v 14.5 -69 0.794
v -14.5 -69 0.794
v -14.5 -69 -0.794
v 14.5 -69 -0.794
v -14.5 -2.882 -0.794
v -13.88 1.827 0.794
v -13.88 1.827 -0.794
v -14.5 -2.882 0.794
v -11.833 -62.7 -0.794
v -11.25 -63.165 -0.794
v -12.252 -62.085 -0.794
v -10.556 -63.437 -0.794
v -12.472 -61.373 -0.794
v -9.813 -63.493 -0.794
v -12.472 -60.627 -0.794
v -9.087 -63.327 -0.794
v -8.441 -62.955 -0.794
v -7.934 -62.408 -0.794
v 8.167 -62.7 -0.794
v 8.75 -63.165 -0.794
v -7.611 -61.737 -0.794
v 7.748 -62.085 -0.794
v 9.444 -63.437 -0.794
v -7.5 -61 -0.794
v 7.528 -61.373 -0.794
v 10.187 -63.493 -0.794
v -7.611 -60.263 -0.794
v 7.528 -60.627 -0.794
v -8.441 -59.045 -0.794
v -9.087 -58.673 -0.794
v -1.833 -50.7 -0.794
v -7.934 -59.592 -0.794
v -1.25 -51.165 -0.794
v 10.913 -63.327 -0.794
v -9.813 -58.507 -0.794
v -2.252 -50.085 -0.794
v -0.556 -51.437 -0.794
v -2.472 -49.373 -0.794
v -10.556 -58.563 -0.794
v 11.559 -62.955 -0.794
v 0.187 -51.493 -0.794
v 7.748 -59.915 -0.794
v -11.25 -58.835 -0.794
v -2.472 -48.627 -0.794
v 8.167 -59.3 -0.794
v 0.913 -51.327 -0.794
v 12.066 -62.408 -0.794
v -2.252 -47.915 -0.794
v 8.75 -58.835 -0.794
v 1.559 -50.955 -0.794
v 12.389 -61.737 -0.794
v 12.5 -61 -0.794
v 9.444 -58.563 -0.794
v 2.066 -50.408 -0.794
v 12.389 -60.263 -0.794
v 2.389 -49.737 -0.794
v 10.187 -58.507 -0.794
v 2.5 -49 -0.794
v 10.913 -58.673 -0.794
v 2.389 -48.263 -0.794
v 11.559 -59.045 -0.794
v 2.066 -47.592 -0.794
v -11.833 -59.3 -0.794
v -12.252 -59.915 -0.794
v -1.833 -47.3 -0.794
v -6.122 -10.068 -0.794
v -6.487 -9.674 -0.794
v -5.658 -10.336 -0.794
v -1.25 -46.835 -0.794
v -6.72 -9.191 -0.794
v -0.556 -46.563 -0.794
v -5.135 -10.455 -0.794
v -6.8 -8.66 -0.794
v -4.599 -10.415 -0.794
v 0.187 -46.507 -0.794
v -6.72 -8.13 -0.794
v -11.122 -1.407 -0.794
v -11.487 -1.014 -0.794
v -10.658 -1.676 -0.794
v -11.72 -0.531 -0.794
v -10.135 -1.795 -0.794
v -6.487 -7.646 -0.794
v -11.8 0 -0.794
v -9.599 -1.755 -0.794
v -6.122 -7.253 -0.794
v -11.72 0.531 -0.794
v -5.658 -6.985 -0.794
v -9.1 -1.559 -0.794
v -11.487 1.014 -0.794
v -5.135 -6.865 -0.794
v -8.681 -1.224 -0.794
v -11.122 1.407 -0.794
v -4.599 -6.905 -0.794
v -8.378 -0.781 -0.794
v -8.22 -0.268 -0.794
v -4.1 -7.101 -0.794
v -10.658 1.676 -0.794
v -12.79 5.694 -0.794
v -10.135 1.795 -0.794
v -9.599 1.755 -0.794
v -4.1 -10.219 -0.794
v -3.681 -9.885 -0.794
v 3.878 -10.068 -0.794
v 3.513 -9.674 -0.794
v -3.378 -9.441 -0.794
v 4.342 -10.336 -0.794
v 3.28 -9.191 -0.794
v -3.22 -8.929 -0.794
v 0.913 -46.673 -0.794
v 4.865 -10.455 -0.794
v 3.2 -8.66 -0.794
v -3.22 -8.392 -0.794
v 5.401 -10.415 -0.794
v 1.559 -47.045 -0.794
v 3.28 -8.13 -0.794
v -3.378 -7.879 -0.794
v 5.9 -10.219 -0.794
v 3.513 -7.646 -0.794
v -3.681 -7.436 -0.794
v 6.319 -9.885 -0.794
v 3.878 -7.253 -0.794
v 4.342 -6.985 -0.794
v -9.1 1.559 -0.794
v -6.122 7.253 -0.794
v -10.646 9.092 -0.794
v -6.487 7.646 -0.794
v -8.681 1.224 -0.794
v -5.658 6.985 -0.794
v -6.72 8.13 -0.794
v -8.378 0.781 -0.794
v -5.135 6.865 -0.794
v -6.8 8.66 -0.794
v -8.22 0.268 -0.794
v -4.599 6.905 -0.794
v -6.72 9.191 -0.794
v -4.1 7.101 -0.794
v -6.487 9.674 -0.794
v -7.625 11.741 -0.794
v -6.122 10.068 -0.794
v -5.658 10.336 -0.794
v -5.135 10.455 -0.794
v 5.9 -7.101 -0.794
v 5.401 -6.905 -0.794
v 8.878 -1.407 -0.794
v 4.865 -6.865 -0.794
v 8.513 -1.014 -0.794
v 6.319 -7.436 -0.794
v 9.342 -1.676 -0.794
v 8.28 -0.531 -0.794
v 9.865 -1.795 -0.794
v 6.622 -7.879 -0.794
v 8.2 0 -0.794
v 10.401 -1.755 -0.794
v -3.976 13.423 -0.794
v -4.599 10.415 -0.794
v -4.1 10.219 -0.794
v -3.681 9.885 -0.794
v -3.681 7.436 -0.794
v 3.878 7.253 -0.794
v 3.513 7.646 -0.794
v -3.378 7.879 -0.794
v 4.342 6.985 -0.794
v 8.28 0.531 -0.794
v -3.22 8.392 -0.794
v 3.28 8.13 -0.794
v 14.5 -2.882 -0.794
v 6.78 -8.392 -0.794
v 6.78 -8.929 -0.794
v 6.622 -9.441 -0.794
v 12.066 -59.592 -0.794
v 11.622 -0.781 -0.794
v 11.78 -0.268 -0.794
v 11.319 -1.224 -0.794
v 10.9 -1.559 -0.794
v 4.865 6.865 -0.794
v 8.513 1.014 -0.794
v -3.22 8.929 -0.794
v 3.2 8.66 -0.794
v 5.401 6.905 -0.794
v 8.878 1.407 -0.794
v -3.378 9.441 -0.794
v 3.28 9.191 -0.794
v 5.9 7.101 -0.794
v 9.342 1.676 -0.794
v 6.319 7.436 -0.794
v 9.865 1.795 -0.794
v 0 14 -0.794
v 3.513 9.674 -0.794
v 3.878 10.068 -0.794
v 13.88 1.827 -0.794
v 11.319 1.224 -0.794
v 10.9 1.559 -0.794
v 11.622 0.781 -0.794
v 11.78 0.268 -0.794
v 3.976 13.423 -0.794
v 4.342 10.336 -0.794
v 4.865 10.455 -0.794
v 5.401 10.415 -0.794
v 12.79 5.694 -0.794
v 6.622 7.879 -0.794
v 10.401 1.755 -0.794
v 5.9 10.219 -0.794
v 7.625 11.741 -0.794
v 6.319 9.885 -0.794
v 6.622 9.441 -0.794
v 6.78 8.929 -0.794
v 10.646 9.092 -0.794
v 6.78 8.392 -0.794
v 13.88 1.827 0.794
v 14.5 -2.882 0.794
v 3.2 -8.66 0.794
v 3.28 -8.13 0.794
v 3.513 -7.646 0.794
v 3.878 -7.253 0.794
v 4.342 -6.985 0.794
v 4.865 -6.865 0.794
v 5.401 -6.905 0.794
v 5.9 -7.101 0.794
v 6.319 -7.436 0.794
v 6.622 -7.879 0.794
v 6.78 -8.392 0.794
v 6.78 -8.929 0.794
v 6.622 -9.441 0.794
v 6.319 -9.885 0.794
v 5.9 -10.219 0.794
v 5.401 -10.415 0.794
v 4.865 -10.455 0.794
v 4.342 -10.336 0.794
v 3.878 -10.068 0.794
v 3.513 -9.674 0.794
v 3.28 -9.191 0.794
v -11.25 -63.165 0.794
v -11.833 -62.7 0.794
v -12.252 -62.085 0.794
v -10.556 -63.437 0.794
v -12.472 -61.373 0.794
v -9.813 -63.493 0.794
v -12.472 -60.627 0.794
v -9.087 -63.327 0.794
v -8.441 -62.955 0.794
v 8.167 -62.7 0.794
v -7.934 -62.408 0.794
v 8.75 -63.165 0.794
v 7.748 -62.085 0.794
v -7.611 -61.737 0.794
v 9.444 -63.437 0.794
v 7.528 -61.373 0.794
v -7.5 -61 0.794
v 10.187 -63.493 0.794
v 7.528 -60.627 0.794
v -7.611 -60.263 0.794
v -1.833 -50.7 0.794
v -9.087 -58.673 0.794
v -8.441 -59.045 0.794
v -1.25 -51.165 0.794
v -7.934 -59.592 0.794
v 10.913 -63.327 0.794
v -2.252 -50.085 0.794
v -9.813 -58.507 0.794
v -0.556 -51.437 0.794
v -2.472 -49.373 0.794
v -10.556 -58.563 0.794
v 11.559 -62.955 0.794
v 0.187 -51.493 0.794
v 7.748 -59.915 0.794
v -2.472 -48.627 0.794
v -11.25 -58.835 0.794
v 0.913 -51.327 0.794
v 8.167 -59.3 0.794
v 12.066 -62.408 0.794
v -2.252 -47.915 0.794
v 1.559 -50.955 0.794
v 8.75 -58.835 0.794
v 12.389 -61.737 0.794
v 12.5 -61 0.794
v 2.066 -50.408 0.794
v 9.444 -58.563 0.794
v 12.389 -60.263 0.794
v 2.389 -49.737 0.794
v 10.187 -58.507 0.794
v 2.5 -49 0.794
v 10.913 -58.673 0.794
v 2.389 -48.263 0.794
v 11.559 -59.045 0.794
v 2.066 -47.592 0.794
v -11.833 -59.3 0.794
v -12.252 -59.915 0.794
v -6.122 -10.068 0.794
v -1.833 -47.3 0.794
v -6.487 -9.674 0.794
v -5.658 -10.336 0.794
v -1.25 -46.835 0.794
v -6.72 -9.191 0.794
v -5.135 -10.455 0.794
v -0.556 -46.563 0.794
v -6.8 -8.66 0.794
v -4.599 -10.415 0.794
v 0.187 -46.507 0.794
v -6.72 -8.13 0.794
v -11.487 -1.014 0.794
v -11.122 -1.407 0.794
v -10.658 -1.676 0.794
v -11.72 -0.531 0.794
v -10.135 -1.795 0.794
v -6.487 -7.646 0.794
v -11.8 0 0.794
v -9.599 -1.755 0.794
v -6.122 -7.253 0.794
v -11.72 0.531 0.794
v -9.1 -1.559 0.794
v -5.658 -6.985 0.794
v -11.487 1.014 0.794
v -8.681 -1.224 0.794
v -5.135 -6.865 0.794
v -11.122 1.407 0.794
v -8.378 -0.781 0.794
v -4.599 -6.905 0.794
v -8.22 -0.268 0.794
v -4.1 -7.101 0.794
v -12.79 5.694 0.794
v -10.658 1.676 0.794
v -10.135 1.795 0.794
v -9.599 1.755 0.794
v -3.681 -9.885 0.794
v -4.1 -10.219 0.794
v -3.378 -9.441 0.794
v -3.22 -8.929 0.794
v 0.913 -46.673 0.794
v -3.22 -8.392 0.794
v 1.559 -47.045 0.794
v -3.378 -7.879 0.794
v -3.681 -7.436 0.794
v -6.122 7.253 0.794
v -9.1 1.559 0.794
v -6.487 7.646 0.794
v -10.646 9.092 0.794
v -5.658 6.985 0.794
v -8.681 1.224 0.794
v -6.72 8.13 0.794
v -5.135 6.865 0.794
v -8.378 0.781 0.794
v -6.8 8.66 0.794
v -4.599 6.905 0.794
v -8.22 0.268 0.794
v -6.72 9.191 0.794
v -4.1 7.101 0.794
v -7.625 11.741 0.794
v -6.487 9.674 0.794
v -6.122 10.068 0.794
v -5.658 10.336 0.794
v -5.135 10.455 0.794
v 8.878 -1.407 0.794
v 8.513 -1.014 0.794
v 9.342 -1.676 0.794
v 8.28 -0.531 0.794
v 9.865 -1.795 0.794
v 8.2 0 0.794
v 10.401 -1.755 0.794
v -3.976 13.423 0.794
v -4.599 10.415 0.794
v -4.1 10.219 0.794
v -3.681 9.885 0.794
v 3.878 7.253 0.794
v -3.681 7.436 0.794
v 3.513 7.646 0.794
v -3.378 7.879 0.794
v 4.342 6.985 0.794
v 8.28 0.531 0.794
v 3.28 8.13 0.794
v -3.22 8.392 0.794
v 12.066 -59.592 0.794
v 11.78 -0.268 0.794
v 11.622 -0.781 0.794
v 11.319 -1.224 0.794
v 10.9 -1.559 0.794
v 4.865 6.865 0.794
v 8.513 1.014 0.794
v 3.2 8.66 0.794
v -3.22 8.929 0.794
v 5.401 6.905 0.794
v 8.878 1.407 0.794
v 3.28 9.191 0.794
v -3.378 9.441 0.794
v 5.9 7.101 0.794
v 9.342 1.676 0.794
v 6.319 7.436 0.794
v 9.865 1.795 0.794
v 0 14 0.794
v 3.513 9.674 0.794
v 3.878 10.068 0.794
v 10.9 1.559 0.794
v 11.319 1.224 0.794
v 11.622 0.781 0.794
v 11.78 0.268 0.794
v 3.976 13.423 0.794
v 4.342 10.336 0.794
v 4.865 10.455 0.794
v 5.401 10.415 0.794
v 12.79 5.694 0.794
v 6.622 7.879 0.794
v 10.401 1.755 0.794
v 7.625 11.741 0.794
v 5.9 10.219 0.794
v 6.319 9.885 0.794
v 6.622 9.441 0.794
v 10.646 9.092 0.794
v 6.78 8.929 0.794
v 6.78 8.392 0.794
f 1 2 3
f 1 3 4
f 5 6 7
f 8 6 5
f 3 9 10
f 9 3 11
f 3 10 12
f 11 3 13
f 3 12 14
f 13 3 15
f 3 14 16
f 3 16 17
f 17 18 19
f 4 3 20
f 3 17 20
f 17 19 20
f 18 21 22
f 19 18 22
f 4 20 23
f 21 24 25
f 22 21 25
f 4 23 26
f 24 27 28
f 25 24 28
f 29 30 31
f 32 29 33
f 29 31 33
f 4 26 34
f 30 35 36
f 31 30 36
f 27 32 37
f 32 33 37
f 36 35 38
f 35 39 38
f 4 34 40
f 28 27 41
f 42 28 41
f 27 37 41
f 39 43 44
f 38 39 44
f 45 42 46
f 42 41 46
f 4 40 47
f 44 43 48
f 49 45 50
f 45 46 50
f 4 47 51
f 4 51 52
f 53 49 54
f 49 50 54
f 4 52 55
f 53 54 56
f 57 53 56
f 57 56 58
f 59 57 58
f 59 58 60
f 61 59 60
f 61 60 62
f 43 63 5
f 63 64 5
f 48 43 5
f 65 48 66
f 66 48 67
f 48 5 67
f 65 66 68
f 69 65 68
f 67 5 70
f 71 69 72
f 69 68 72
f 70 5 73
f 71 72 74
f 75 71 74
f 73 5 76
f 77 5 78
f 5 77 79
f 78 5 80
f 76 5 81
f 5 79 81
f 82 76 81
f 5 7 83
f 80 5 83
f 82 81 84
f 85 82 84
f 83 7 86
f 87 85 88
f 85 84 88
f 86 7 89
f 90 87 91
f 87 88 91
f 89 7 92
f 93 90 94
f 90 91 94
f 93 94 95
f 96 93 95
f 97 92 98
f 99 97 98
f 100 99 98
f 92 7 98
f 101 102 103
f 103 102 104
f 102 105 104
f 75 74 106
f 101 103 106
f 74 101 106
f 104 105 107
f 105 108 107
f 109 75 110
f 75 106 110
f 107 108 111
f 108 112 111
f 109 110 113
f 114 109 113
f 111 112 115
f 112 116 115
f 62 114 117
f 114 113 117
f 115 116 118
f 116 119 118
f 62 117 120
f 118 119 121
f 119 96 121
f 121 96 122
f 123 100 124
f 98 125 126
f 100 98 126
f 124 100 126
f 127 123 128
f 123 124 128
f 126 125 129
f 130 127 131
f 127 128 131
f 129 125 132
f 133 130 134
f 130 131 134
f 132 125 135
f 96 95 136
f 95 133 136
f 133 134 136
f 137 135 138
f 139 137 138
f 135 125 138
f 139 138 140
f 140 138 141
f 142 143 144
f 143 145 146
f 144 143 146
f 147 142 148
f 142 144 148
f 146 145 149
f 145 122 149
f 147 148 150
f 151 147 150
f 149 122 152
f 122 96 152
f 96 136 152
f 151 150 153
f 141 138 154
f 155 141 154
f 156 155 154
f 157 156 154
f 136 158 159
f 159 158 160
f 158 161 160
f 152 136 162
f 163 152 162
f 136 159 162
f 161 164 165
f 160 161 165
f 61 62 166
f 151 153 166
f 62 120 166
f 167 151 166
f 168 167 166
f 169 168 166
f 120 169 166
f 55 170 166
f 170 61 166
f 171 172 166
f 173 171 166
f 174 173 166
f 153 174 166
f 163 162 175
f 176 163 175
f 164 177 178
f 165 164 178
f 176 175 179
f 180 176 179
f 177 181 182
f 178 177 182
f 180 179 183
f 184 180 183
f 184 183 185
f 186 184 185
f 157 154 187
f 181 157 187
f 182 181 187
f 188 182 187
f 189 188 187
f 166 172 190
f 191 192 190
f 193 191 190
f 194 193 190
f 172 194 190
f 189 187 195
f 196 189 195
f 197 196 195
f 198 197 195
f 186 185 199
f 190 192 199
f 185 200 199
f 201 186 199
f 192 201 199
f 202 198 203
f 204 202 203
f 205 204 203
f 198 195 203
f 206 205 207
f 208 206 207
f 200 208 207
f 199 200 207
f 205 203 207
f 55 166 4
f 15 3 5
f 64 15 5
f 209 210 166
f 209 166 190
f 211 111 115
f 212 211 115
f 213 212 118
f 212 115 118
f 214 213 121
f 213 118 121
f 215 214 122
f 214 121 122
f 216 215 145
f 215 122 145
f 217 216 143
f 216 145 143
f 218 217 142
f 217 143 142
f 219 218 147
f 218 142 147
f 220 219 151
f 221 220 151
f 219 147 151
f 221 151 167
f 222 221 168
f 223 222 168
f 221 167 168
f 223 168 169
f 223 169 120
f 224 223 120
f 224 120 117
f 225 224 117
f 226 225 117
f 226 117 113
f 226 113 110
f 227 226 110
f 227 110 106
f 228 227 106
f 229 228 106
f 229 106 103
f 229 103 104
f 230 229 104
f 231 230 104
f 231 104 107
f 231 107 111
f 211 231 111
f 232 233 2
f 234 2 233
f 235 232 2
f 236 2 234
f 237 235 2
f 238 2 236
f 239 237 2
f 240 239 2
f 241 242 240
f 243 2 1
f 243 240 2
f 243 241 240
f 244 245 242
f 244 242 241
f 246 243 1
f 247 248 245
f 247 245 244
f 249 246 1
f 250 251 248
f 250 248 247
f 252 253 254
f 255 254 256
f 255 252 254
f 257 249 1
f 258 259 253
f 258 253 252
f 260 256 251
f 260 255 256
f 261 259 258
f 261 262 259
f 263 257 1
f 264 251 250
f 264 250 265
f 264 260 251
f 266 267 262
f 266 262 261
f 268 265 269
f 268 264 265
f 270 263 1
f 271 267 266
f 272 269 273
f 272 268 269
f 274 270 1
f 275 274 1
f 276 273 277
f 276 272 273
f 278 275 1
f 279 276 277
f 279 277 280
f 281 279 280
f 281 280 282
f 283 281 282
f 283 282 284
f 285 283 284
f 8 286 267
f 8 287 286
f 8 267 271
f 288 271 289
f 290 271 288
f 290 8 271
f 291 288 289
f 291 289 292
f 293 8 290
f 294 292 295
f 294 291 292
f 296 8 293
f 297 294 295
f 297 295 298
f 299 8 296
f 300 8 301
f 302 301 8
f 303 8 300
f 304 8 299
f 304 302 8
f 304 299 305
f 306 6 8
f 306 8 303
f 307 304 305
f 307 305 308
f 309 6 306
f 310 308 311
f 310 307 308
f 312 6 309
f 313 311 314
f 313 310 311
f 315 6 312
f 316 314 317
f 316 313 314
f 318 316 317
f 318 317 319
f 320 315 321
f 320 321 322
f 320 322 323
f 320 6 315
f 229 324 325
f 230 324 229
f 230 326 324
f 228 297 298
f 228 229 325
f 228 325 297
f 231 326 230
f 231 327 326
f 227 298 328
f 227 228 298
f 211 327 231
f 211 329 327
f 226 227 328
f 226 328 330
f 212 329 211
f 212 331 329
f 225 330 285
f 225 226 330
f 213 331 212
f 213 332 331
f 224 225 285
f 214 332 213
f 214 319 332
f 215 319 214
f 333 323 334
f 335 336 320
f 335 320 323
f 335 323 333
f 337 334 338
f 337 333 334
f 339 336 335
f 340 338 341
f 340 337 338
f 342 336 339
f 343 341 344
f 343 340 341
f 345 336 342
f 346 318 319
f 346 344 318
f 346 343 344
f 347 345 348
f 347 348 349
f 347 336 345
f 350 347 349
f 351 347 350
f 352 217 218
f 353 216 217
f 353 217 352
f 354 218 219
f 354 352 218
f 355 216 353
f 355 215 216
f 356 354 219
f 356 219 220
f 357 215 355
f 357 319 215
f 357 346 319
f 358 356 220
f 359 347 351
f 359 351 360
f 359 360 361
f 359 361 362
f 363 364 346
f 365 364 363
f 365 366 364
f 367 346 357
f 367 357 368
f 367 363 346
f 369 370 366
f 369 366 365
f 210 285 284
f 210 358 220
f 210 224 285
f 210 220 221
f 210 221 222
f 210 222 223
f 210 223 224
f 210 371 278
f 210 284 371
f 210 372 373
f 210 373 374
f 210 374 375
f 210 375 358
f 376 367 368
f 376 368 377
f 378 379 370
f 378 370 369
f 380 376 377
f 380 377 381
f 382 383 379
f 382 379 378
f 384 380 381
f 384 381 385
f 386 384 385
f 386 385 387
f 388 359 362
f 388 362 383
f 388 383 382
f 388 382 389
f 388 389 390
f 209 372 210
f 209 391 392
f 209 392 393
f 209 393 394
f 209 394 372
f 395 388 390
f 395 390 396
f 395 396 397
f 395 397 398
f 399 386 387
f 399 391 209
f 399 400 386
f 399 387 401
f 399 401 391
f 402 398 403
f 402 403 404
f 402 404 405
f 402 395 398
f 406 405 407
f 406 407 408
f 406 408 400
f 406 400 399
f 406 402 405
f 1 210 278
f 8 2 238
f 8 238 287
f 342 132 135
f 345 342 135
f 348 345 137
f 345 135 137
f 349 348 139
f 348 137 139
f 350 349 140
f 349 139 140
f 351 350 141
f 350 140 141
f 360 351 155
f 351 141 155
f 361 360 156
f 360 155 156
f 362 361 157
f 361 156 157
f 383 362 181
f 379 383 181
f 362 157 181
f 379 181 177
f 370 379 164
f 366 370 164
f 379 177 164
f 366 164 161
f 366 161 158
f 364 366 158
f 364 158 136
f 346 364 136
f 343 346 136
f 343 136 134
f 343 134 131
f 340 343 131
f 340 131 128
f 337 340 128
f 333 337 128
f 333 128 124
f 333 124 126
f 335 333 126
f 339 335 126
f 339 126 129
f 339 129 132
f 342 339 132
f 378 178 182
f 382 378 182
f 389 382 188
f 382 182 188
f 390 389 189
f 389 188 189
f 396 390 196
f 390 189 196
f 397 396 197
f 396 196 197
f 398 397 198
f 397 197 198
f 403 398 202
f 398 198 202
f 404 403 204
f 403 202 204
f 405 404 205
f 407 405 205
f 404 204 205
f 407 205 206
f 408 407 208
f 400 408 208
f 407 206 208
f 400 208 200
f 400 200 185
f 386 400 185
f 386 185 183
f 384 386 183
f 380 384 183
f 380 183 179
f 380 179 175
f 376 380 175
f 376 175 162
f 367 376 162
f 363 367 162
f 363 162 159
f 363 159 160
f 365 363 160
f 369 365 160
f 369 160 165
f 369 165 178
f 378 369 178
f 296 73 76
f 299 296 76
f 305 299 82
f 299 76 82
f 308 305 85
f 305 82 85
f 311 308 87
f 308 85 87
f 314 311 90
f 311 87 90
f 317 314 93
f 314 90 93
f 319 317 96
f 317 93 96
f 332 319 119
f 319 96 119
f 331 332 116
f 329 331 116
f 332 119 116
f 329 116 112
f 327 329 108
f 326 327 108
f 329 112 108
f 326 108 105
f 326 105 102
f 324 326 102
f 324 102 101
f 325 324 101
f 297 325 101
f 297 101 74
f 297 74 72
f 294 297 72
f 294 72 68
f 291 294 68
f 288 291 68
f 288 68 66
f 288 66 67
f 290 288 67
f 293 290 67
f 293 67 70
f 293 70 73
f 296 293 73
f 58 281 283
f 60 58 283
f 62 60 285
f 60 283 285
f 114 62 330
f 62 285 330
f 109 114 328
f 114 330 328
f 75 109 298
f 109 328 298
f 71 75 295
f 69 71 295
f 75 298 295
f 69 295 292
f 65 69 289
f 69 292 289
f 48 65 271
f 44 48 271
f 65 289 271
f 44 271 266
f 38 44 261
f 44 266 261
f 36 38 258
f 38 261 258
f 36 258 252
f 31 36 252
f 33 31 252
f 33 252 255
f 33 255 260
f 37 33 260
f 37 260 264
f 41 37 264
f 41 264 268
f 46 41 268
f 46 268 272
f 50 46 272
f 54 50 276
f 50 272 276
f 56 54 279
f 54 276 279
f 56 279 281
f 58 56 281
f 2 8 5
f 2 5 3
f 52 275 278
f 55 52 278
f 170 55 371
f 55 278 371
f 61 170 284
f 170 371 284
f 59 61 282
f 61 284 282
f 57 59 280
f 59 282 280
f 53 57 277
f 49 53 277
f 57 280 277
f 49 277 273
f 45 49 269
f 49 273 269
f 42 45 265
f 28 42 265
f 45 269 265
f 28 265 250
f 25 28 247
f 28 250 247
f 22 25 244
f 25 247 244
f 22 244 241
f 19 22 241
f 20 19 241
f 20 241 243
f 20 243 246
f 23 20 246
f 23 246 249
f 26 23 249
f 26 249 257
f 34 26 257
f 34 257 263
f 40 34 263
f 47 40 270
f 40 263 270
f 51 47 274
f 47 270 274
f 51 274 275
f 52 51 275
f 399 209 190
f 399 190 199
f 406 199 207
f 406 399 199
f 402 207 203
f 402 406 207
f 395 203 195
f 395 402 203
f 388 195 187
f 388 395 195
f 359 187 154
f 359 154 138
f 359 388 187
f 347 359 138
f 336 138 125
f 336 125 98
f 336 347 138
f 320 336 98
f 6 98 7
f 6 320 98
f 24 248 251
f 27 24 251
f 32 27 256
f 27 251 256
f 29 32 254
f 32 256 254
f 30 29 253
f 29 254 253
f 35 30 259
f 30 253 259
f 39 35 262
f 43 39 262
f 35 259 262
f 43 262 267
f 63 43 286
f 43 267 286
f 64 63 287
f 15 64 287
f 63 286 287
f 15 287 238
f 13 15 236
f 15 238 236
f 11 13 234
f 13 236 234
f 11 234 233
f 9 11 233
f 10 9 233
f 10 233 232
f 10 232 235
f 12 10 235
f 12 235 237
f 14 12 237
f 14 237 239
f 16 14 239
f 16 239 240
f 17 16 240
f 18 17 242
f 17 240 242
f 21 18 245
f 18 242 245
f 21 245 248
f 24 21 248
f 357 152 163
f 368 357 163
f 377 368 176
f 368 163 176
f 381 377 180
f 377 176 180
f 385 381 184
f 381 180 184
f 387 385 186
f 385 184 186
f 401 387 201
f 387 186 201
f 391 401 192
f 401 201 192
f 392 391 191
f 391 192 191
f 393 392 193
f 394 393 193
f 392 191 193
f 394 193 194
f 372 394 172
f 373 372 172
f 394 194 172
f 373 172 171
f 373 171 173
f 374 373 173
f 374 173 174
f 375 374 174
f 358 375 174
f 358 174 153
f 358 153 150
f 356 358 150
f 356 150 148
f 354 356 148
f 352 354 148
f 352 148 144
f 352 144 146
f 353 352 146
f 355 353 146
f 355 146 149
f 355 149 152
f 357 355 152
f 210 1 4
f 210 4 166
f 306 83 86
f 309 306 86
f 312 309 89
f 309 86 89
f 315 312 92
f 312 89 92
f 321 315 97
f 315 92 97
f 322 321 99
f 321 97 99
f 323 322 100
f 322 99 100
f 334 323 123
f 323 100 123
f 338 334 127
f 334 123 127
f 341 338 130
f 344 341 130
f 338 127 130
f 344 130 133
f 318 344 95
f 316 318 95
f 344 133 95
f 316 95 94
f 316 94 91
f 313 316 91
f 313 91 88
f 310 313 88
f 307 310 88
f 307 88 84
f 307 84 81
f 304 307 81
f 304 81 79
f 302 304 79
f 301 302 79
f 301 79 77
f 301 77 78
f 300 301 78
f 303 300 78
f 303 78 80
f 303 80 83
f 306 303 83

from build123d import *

# Parameters (mm, degrees)
SKETCH1_R            = 14
BOSS_EXTRUDE1_DEPTH  = 0.79375
SKETCH2_R            = 2.5
BOSS_EXTRUDE2_DEPTH  = 1.5875
M3_CLEARANCE_HOLE1_D = 3.6
CUT_EXTRUDE1_START   = -10
CUT_EXTRUDE1_DEPTH   = 10


with BuildPart() as part:
    # Sketch1 → Boss-Extrude1 (new, symmetric)
    with BuildSketch(Plane.XY):
        Circle(SKETCH1_R)
    extrude(amount=BOSS_EXTRUDE1_DEPTH, both=True)

    # Sketch2 → Boss-Extrude2 (add, through all)
    with BuildSketch(Plane.XY.offset(0.79375)):
        with BuildLine():
            Line((-13.880322311, 1.826650632), (-22.457257968, -63.347624774))
            ThreePointArc((-22.457257968, -63.347624774), (-21.259114, -67.29682604), (-17.5, -69))
            Line((-17.5, -69), (17.5, -69))
            ThreePointArc((17.5, -69), (21.259114, -67.29682604), (22.457257968, -63.347624774))
            Line((22.457257968, -63.347624774), (13.880322311, 1.826650632))
            Line((13.880322311, 1.826650632), (-13.880322311, 1.826650632))
        make_face()
        with Locations((-10, -61)):
            Circle(SKETCH2_R, mode=Mode.SUBTRACT)
        with Locations((10, -61)):
            Circle(SKETCH2_R, mode=Mode.SUBTRACT)
        with Locations((0, -49)):
            Circle(SKETCH2_R, mode=Mode.SUBTRACT)
    extrude(amount=-BOSS_EXTRUDE2_DEPTH)

    # M3 Clearance Hole1 (through all)
    with Locations(Plane.XY.offset(0.79375)):
        with Locations((5, 8.660254038), (-5, 8.660254038), (-10, 0), (-5, -8.660254038), (5, -8.660254038), (10, 0)):
            Hole(M3_CLEARANCE_HOLE1_D / 2)

    # Sketch5 → Cut-Extrude1 (cut)
    with BuildSketch(Plane(origin=(0, 0, -0.79375), x_dir=(-1, 0, 0), z_dir=(0, 0, -1)).offset(CUT_EXTRUDE1_START)):
        with BuildLine():
            Line((-14.5, -69), (-14.5, -2.882145837))
            Line((-14.5, -2.882145837), (-22.457257968, -63.347624774))
            ThreePointArc((-22.457257968, -63.347624774), (-21.259114, -67.29682604), (-17.5, -69))
            Line((-17.5, -69), (-14.5, -69))
        make_face()
        with BuildLine():
            Line((22.457257968, -63.347624774), (14.5, -2.882145837))
            Line((14.5, -2.882145837), (14.5, -69))
            Line((14.5, -69), (17.5, -69))
            ThreePointArc((17.5, -69), (21.259114, -67.29682604), (22.457257968, -63.347624774))
        make_face()
    extrude(amount=CUT_EXTRUDE1_DEPTH, mode=Mode.SUBTRACT)


solid = part.part
